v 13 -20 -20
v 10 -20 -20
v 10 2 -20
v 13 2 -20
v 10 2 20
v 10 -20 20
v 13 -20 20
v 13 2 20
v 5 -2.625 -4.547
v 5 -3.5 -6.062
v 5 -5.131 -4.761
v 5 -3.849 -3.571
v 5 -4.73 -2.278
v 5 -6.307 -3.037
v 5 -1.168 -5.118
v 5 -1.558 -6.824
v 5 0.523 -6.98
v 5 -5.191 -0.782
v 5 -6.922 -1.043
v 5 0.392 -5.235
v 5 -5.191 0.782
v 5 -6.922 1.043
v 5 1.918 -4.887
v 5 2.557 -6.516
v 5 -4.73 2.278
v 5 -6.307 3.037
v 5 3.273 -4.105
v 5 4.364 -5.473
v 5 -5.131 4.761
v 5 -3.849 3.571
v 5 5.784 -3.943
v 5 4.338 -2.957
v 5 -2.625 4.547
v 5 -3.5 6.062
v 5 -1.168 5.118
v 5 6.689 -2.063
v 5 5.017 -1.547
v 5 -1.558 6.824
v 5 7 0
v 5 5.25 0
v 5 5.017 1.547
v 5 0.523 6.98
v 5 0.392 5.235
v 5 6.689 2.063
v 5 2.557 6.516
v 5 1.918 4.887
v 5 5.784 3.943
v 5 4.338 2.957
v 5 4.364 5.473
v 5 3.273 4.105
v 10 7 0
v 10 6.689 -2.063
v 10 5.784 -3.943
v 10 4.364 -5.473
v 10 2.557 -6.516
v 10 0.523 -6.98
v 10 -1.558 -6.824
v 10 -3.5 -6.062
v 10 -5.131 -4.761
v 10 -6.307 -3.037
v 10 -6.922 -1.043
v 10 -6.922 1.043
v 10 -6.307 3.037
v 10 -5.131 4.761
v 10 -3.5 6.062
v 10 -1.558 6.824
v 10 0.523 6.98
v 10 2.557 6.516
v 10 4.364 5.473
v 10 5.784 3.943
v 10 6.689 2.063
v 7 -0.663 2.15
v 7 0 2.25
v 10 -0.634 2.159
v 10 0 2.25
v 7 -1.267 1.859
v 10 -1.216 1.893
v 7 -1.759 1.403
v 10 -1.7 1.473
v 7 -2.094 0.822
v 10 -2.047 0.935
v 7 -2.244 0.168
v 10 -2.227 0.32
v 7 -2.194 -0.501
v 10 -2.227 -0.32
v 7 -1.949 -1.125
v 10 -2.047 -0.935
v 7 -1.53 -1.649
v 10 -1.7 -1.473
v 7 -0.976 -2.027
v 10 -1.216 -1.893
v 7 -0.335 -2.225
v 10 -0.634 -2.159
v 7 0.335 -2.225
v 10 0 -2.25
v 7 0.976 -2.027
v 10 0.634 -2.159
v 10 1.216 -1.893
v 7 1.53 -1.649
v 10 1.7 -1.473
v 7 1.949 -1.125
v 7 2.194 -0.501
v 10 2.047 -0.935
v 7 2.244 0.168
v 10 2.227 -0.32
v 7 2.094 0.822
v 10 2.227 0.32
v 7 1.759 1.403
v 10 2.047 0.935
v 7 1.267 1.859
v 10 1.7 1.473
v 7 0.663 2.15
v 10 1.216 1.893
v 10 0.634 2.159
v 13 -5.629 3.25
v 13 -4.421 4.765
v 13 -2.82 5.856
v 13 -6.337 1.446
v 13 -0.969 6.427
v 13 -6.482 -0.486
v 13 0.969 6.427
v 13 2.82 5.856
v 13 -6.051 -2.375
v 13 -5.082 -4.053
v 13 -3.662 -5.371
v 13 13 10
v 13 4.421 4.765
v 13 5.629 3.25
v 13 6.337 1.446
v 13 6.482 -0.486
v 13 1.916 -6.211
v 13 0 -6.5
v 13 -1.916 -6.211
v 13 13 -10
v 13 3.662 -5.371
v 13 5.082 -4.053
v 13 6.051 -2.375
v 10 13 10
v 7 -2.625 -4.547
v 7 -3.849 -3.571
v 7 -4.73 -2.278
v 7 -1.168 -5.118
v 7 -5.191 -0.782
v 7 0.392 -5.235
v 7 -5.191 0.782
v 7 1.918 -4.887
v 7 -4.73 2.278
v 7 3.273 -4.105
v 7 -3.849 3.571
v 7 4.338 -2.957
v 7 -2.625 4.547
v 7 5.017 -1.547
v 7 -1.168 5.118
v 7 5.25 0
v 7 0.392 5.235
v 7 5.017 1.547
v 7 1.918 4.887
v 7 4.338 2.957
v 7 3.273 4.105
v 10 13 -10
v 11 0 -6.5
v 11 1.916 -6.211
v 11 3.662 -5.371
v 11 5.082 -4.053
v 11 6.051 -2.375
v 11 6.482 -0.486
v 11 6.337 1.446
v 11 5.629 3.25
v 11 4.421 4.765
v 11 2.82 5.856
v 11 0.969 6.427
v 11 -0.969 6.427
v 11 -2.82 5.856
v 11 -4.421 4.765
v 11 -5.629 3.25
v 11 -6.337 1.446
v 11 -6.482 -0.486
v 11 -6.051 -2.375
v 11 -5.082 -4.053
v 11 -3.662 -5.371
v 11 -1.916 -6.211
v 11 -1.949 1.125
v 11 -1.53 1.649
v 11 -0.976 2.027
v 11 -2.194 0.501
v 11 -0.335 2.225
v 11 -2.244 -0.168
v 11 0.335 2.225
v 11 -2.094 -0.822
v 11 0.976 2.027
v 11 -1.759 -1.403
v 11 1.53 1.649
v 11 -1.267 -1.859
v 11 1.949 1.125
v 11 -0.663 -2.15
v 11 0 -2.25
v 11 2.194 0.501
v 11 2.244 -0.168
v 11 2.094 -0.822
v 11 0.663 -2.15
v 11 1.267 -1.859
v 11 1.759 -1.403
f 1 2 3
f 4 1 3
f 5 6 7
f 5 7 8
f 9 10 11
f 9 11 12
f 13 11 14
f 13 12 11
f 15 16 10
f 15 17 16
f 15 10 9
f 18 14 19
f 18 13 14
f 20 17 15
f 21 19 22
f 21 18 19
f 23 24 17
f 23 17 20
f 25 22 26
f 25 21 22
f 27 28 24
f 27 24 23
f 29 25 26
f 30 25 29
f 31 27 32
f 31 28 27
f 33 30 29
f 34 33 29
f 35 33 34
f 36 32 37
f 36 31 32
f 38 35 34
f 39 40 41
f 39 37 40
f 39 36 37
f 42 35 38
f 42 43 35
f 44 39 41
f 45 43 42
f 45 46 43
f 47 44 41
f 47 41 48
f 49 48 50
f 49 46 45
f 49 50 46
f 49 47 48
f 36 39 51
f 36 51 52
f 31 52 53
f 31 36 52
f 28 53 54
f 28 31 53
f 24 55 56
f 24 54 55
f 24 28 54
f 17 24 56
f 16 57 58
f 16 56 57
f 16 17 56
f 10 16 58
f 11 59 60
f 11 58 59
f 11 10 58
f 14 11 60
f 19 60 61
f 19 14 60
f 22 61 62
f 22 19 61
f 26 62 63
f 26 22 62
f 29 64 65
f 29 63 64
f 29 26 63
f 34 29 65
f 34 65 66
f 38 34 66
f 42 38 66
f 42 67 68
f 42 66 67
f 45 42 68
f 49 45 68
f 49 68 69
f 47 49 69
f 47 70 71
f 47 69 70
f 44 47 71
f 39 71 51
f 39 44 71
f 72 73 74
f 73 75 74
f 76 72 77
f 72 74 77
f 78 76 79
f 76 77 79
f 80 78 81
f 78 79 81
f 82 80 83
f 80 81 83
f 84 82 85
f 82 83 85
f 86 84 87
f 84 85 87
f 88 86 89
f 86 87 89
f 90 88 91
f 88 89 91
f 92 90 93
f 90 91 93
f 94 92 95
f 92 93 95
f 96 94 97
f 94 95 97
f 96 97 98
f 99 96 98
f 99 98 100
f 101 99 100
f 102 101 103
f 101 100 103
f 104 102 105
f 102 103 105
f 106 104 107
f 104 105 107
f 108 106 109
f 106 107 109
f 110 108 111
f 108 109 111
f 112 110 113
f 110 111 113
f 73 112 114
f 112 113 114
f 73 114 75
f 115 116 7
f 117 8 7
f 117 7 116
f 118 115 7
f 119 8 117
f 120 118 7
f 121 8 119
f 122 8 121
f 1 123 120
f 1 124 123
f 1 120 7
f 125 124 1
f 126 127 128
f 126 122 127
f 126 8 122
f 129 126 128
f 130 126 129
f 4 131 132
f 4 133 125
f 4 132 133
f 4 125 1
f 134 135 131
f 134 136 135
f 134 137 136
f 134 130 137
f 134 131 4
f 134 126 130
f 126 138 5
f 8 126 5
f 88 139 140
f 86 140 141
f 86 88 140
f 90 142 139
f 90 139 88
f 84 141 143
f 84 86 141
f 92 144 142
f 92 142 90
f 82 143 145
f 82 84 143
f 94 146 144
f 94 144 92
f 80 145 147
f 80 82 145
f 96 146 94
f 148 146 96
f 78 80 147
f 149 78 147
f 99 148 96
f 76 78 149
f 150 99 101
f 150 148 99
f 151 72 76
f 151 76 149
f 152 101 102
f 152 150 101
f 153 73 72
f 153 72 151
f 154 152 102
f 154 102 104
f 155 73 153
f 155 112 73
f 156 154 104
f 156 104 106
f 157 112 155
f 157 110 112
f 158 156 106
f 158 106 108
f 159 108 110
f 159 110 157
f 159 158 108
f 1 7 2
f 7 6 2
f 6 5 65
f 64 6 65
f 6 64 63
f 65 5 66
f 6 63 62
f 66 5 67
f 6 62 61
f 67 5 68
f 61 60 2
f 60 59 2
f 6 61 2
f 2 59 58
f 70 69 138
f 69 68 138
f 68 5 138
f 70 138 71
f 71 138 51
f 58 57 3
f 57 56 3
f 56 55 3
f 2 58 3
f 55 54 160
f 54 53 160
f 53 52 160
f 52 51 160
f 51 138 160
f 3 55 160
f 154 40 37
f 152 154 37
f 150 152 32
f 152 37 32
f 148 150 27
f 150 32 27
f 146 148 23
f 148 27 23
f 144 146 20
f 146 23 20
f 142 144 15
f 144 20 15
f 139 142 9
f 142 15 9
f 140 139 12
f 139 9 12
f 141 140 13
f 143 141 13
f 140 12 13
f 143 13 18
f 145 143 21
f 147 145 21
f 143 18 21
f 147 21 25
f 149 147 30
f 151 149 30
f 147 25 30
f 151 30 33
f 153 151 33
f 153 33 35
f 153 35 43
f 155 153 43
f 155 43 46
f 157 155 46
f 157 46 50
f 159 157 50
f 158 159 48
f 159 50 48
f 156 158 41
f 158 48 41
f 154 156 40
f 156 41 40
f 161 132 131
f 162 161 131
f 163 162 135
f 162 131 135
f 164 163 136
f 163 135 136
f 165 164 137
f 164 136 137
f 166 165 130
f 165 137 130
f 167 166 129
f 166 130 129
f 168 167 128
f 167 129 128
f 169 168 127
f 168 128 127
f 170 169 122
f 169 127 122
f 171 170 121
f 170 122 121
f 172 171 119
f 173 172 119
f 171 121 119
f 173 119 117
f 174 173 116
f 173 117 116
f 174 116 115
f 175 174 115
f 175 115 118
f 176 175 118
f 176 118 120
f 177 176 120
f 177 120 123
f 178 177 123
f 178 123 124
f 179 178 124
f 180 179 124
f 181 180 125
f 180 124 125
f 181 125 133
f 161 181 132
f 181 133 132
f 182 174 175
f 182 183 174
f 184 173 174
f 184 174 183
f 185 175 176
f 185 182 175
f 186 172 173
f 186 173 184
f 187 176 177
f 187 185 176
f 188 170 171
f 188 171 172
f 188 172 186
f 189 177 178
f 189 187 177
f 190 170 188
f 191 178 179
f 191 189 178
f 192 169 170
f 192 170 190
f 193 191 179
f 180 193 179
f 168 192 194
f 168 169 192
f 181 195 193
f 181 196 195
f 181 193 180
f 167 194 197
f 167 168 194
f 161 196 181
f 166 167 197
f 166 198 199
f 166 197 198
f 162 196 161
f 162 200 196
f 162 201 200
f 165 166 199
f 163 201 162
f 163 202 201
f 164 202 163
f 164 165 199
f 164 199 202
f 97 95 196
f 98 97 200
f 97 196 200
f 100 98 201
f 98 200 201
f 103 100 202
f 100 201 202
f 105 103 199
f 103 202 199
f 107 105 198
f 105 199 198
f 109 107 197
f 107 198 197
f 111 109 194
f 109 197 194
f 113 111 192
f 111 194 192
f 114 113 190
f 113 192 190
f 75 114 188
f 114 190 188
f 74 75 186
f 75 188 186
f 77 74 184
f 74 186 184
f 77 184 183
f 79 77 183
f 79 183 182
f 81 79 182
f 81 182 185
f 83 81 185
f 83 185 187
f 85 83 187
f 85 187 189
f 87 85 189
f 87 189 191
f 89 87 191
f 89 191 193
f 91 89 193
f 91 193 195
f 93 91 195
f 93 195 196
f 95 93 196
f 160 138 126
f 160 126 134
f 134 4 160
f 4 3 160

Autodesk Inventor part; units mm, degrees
ref_plane "YZ Plane" through (0, 0, 0) normal (1, 0, 0) x (0, 1, 0)
ref_plane "XZ Plane" through (0, 0, 0) normal (0, 1, 0) x (-1, 0, 0)
ref_plane "XY Plane" through (0, 0, 0) normal (0, 0, 1) x (1, 0, 0)
sketch "Esquisse1" plane through (0, 0, 0) normal (1, 0, 0) x (0, 1, 0)
  circle A0 centre (0, 0) radius 5.25
  circle A1 centre (0, 0) radius 7
  dimension "d0" = 10.5
  dimension "d1" = 14
extrude "Extrusion1" add sketch "Esquisse1" along normal blind 10
sketch "Esquisse2" plane through (10, 0, 0) normal (1, 0, 0) x (0, 0, -1)
  line L0 (20, -20) -> (-20, 20) construction
  line L1 (-20, -20) -> (20, 20) construction
  circle A0 centre (0, 0) radius 17.5 construction
  line L2 (0, 0) -> (0, 13) construction
  line L3 (0, 13) -> (10, 13)
  line L4 (10, 13) -> (-10, 13)
  line L5 (0, 0) -> (0, -20) construction
  line L6 (0, -20) -> (20, -20)
  line L7 (20, -20) -> (-20, -20)
  line L8 (-20, -20) -> (-20, 2)
  line L9 (20, -20) -> (20, 2)
  line L10 (20, 2) -> (10, 13)
  line L11 (-10, 13) -> (-20, 2)
  dimension "d41" = 35
  dimension "d44" = 13
  dimension "d45" = 10
  dimension "d46" = 20
  dimension "d47" = 20
  dimension "d48" = 20
  dimension "d49" = 22
  dimension "d50" = 14.8661
  dimension "d51" = 14.8661
extrude "Extrusion2" add sketch "Esquisse2" along normal blind 3
sketch "Esquisse7" plane through (13, 0, 0) normal (1, 0, 0) x (0, 0, -1)
  circle A0 centre (0, 0) radius 2.25
  dimension "d25" = 4.5
extrude "Extrusion7" cut sketch "Esquisse7" against normal blind 59.75
sketch "Esquisse12" plane through (0, 0, 0) normal (-1, 0, 0) x (0, 0, 1)
  circle A0 centre (0, 0) radius 5.25 projected
  circle A1 centre (0, 0) radius 7 projected
extrude "Extrusion10" cut sketch "Esquisse12" against normal blind 5
sketch "Esquisse13" plane through (13, 0, 0) normal (1, 0, 0) x (0, 0, -1)
  circle A0 centre (0, 0) radius 6.5
  dimension "d52" = 13
extrude "Extrusion11" cut sketch "Esquisse13" against normal blind 2
sketch "Esquisse14" plane through (10, 0, 0) normal (-1, 0, 0) x (0, 0, 1)
  circle A0 centre (0, 0) radius 2.25 projected
  circle A1 centre (0, 0) radius 5.25 projected
extrude "Extrusion12" add sketch "Esquisse14" along normal blind 3
properties part number "percuteur"
